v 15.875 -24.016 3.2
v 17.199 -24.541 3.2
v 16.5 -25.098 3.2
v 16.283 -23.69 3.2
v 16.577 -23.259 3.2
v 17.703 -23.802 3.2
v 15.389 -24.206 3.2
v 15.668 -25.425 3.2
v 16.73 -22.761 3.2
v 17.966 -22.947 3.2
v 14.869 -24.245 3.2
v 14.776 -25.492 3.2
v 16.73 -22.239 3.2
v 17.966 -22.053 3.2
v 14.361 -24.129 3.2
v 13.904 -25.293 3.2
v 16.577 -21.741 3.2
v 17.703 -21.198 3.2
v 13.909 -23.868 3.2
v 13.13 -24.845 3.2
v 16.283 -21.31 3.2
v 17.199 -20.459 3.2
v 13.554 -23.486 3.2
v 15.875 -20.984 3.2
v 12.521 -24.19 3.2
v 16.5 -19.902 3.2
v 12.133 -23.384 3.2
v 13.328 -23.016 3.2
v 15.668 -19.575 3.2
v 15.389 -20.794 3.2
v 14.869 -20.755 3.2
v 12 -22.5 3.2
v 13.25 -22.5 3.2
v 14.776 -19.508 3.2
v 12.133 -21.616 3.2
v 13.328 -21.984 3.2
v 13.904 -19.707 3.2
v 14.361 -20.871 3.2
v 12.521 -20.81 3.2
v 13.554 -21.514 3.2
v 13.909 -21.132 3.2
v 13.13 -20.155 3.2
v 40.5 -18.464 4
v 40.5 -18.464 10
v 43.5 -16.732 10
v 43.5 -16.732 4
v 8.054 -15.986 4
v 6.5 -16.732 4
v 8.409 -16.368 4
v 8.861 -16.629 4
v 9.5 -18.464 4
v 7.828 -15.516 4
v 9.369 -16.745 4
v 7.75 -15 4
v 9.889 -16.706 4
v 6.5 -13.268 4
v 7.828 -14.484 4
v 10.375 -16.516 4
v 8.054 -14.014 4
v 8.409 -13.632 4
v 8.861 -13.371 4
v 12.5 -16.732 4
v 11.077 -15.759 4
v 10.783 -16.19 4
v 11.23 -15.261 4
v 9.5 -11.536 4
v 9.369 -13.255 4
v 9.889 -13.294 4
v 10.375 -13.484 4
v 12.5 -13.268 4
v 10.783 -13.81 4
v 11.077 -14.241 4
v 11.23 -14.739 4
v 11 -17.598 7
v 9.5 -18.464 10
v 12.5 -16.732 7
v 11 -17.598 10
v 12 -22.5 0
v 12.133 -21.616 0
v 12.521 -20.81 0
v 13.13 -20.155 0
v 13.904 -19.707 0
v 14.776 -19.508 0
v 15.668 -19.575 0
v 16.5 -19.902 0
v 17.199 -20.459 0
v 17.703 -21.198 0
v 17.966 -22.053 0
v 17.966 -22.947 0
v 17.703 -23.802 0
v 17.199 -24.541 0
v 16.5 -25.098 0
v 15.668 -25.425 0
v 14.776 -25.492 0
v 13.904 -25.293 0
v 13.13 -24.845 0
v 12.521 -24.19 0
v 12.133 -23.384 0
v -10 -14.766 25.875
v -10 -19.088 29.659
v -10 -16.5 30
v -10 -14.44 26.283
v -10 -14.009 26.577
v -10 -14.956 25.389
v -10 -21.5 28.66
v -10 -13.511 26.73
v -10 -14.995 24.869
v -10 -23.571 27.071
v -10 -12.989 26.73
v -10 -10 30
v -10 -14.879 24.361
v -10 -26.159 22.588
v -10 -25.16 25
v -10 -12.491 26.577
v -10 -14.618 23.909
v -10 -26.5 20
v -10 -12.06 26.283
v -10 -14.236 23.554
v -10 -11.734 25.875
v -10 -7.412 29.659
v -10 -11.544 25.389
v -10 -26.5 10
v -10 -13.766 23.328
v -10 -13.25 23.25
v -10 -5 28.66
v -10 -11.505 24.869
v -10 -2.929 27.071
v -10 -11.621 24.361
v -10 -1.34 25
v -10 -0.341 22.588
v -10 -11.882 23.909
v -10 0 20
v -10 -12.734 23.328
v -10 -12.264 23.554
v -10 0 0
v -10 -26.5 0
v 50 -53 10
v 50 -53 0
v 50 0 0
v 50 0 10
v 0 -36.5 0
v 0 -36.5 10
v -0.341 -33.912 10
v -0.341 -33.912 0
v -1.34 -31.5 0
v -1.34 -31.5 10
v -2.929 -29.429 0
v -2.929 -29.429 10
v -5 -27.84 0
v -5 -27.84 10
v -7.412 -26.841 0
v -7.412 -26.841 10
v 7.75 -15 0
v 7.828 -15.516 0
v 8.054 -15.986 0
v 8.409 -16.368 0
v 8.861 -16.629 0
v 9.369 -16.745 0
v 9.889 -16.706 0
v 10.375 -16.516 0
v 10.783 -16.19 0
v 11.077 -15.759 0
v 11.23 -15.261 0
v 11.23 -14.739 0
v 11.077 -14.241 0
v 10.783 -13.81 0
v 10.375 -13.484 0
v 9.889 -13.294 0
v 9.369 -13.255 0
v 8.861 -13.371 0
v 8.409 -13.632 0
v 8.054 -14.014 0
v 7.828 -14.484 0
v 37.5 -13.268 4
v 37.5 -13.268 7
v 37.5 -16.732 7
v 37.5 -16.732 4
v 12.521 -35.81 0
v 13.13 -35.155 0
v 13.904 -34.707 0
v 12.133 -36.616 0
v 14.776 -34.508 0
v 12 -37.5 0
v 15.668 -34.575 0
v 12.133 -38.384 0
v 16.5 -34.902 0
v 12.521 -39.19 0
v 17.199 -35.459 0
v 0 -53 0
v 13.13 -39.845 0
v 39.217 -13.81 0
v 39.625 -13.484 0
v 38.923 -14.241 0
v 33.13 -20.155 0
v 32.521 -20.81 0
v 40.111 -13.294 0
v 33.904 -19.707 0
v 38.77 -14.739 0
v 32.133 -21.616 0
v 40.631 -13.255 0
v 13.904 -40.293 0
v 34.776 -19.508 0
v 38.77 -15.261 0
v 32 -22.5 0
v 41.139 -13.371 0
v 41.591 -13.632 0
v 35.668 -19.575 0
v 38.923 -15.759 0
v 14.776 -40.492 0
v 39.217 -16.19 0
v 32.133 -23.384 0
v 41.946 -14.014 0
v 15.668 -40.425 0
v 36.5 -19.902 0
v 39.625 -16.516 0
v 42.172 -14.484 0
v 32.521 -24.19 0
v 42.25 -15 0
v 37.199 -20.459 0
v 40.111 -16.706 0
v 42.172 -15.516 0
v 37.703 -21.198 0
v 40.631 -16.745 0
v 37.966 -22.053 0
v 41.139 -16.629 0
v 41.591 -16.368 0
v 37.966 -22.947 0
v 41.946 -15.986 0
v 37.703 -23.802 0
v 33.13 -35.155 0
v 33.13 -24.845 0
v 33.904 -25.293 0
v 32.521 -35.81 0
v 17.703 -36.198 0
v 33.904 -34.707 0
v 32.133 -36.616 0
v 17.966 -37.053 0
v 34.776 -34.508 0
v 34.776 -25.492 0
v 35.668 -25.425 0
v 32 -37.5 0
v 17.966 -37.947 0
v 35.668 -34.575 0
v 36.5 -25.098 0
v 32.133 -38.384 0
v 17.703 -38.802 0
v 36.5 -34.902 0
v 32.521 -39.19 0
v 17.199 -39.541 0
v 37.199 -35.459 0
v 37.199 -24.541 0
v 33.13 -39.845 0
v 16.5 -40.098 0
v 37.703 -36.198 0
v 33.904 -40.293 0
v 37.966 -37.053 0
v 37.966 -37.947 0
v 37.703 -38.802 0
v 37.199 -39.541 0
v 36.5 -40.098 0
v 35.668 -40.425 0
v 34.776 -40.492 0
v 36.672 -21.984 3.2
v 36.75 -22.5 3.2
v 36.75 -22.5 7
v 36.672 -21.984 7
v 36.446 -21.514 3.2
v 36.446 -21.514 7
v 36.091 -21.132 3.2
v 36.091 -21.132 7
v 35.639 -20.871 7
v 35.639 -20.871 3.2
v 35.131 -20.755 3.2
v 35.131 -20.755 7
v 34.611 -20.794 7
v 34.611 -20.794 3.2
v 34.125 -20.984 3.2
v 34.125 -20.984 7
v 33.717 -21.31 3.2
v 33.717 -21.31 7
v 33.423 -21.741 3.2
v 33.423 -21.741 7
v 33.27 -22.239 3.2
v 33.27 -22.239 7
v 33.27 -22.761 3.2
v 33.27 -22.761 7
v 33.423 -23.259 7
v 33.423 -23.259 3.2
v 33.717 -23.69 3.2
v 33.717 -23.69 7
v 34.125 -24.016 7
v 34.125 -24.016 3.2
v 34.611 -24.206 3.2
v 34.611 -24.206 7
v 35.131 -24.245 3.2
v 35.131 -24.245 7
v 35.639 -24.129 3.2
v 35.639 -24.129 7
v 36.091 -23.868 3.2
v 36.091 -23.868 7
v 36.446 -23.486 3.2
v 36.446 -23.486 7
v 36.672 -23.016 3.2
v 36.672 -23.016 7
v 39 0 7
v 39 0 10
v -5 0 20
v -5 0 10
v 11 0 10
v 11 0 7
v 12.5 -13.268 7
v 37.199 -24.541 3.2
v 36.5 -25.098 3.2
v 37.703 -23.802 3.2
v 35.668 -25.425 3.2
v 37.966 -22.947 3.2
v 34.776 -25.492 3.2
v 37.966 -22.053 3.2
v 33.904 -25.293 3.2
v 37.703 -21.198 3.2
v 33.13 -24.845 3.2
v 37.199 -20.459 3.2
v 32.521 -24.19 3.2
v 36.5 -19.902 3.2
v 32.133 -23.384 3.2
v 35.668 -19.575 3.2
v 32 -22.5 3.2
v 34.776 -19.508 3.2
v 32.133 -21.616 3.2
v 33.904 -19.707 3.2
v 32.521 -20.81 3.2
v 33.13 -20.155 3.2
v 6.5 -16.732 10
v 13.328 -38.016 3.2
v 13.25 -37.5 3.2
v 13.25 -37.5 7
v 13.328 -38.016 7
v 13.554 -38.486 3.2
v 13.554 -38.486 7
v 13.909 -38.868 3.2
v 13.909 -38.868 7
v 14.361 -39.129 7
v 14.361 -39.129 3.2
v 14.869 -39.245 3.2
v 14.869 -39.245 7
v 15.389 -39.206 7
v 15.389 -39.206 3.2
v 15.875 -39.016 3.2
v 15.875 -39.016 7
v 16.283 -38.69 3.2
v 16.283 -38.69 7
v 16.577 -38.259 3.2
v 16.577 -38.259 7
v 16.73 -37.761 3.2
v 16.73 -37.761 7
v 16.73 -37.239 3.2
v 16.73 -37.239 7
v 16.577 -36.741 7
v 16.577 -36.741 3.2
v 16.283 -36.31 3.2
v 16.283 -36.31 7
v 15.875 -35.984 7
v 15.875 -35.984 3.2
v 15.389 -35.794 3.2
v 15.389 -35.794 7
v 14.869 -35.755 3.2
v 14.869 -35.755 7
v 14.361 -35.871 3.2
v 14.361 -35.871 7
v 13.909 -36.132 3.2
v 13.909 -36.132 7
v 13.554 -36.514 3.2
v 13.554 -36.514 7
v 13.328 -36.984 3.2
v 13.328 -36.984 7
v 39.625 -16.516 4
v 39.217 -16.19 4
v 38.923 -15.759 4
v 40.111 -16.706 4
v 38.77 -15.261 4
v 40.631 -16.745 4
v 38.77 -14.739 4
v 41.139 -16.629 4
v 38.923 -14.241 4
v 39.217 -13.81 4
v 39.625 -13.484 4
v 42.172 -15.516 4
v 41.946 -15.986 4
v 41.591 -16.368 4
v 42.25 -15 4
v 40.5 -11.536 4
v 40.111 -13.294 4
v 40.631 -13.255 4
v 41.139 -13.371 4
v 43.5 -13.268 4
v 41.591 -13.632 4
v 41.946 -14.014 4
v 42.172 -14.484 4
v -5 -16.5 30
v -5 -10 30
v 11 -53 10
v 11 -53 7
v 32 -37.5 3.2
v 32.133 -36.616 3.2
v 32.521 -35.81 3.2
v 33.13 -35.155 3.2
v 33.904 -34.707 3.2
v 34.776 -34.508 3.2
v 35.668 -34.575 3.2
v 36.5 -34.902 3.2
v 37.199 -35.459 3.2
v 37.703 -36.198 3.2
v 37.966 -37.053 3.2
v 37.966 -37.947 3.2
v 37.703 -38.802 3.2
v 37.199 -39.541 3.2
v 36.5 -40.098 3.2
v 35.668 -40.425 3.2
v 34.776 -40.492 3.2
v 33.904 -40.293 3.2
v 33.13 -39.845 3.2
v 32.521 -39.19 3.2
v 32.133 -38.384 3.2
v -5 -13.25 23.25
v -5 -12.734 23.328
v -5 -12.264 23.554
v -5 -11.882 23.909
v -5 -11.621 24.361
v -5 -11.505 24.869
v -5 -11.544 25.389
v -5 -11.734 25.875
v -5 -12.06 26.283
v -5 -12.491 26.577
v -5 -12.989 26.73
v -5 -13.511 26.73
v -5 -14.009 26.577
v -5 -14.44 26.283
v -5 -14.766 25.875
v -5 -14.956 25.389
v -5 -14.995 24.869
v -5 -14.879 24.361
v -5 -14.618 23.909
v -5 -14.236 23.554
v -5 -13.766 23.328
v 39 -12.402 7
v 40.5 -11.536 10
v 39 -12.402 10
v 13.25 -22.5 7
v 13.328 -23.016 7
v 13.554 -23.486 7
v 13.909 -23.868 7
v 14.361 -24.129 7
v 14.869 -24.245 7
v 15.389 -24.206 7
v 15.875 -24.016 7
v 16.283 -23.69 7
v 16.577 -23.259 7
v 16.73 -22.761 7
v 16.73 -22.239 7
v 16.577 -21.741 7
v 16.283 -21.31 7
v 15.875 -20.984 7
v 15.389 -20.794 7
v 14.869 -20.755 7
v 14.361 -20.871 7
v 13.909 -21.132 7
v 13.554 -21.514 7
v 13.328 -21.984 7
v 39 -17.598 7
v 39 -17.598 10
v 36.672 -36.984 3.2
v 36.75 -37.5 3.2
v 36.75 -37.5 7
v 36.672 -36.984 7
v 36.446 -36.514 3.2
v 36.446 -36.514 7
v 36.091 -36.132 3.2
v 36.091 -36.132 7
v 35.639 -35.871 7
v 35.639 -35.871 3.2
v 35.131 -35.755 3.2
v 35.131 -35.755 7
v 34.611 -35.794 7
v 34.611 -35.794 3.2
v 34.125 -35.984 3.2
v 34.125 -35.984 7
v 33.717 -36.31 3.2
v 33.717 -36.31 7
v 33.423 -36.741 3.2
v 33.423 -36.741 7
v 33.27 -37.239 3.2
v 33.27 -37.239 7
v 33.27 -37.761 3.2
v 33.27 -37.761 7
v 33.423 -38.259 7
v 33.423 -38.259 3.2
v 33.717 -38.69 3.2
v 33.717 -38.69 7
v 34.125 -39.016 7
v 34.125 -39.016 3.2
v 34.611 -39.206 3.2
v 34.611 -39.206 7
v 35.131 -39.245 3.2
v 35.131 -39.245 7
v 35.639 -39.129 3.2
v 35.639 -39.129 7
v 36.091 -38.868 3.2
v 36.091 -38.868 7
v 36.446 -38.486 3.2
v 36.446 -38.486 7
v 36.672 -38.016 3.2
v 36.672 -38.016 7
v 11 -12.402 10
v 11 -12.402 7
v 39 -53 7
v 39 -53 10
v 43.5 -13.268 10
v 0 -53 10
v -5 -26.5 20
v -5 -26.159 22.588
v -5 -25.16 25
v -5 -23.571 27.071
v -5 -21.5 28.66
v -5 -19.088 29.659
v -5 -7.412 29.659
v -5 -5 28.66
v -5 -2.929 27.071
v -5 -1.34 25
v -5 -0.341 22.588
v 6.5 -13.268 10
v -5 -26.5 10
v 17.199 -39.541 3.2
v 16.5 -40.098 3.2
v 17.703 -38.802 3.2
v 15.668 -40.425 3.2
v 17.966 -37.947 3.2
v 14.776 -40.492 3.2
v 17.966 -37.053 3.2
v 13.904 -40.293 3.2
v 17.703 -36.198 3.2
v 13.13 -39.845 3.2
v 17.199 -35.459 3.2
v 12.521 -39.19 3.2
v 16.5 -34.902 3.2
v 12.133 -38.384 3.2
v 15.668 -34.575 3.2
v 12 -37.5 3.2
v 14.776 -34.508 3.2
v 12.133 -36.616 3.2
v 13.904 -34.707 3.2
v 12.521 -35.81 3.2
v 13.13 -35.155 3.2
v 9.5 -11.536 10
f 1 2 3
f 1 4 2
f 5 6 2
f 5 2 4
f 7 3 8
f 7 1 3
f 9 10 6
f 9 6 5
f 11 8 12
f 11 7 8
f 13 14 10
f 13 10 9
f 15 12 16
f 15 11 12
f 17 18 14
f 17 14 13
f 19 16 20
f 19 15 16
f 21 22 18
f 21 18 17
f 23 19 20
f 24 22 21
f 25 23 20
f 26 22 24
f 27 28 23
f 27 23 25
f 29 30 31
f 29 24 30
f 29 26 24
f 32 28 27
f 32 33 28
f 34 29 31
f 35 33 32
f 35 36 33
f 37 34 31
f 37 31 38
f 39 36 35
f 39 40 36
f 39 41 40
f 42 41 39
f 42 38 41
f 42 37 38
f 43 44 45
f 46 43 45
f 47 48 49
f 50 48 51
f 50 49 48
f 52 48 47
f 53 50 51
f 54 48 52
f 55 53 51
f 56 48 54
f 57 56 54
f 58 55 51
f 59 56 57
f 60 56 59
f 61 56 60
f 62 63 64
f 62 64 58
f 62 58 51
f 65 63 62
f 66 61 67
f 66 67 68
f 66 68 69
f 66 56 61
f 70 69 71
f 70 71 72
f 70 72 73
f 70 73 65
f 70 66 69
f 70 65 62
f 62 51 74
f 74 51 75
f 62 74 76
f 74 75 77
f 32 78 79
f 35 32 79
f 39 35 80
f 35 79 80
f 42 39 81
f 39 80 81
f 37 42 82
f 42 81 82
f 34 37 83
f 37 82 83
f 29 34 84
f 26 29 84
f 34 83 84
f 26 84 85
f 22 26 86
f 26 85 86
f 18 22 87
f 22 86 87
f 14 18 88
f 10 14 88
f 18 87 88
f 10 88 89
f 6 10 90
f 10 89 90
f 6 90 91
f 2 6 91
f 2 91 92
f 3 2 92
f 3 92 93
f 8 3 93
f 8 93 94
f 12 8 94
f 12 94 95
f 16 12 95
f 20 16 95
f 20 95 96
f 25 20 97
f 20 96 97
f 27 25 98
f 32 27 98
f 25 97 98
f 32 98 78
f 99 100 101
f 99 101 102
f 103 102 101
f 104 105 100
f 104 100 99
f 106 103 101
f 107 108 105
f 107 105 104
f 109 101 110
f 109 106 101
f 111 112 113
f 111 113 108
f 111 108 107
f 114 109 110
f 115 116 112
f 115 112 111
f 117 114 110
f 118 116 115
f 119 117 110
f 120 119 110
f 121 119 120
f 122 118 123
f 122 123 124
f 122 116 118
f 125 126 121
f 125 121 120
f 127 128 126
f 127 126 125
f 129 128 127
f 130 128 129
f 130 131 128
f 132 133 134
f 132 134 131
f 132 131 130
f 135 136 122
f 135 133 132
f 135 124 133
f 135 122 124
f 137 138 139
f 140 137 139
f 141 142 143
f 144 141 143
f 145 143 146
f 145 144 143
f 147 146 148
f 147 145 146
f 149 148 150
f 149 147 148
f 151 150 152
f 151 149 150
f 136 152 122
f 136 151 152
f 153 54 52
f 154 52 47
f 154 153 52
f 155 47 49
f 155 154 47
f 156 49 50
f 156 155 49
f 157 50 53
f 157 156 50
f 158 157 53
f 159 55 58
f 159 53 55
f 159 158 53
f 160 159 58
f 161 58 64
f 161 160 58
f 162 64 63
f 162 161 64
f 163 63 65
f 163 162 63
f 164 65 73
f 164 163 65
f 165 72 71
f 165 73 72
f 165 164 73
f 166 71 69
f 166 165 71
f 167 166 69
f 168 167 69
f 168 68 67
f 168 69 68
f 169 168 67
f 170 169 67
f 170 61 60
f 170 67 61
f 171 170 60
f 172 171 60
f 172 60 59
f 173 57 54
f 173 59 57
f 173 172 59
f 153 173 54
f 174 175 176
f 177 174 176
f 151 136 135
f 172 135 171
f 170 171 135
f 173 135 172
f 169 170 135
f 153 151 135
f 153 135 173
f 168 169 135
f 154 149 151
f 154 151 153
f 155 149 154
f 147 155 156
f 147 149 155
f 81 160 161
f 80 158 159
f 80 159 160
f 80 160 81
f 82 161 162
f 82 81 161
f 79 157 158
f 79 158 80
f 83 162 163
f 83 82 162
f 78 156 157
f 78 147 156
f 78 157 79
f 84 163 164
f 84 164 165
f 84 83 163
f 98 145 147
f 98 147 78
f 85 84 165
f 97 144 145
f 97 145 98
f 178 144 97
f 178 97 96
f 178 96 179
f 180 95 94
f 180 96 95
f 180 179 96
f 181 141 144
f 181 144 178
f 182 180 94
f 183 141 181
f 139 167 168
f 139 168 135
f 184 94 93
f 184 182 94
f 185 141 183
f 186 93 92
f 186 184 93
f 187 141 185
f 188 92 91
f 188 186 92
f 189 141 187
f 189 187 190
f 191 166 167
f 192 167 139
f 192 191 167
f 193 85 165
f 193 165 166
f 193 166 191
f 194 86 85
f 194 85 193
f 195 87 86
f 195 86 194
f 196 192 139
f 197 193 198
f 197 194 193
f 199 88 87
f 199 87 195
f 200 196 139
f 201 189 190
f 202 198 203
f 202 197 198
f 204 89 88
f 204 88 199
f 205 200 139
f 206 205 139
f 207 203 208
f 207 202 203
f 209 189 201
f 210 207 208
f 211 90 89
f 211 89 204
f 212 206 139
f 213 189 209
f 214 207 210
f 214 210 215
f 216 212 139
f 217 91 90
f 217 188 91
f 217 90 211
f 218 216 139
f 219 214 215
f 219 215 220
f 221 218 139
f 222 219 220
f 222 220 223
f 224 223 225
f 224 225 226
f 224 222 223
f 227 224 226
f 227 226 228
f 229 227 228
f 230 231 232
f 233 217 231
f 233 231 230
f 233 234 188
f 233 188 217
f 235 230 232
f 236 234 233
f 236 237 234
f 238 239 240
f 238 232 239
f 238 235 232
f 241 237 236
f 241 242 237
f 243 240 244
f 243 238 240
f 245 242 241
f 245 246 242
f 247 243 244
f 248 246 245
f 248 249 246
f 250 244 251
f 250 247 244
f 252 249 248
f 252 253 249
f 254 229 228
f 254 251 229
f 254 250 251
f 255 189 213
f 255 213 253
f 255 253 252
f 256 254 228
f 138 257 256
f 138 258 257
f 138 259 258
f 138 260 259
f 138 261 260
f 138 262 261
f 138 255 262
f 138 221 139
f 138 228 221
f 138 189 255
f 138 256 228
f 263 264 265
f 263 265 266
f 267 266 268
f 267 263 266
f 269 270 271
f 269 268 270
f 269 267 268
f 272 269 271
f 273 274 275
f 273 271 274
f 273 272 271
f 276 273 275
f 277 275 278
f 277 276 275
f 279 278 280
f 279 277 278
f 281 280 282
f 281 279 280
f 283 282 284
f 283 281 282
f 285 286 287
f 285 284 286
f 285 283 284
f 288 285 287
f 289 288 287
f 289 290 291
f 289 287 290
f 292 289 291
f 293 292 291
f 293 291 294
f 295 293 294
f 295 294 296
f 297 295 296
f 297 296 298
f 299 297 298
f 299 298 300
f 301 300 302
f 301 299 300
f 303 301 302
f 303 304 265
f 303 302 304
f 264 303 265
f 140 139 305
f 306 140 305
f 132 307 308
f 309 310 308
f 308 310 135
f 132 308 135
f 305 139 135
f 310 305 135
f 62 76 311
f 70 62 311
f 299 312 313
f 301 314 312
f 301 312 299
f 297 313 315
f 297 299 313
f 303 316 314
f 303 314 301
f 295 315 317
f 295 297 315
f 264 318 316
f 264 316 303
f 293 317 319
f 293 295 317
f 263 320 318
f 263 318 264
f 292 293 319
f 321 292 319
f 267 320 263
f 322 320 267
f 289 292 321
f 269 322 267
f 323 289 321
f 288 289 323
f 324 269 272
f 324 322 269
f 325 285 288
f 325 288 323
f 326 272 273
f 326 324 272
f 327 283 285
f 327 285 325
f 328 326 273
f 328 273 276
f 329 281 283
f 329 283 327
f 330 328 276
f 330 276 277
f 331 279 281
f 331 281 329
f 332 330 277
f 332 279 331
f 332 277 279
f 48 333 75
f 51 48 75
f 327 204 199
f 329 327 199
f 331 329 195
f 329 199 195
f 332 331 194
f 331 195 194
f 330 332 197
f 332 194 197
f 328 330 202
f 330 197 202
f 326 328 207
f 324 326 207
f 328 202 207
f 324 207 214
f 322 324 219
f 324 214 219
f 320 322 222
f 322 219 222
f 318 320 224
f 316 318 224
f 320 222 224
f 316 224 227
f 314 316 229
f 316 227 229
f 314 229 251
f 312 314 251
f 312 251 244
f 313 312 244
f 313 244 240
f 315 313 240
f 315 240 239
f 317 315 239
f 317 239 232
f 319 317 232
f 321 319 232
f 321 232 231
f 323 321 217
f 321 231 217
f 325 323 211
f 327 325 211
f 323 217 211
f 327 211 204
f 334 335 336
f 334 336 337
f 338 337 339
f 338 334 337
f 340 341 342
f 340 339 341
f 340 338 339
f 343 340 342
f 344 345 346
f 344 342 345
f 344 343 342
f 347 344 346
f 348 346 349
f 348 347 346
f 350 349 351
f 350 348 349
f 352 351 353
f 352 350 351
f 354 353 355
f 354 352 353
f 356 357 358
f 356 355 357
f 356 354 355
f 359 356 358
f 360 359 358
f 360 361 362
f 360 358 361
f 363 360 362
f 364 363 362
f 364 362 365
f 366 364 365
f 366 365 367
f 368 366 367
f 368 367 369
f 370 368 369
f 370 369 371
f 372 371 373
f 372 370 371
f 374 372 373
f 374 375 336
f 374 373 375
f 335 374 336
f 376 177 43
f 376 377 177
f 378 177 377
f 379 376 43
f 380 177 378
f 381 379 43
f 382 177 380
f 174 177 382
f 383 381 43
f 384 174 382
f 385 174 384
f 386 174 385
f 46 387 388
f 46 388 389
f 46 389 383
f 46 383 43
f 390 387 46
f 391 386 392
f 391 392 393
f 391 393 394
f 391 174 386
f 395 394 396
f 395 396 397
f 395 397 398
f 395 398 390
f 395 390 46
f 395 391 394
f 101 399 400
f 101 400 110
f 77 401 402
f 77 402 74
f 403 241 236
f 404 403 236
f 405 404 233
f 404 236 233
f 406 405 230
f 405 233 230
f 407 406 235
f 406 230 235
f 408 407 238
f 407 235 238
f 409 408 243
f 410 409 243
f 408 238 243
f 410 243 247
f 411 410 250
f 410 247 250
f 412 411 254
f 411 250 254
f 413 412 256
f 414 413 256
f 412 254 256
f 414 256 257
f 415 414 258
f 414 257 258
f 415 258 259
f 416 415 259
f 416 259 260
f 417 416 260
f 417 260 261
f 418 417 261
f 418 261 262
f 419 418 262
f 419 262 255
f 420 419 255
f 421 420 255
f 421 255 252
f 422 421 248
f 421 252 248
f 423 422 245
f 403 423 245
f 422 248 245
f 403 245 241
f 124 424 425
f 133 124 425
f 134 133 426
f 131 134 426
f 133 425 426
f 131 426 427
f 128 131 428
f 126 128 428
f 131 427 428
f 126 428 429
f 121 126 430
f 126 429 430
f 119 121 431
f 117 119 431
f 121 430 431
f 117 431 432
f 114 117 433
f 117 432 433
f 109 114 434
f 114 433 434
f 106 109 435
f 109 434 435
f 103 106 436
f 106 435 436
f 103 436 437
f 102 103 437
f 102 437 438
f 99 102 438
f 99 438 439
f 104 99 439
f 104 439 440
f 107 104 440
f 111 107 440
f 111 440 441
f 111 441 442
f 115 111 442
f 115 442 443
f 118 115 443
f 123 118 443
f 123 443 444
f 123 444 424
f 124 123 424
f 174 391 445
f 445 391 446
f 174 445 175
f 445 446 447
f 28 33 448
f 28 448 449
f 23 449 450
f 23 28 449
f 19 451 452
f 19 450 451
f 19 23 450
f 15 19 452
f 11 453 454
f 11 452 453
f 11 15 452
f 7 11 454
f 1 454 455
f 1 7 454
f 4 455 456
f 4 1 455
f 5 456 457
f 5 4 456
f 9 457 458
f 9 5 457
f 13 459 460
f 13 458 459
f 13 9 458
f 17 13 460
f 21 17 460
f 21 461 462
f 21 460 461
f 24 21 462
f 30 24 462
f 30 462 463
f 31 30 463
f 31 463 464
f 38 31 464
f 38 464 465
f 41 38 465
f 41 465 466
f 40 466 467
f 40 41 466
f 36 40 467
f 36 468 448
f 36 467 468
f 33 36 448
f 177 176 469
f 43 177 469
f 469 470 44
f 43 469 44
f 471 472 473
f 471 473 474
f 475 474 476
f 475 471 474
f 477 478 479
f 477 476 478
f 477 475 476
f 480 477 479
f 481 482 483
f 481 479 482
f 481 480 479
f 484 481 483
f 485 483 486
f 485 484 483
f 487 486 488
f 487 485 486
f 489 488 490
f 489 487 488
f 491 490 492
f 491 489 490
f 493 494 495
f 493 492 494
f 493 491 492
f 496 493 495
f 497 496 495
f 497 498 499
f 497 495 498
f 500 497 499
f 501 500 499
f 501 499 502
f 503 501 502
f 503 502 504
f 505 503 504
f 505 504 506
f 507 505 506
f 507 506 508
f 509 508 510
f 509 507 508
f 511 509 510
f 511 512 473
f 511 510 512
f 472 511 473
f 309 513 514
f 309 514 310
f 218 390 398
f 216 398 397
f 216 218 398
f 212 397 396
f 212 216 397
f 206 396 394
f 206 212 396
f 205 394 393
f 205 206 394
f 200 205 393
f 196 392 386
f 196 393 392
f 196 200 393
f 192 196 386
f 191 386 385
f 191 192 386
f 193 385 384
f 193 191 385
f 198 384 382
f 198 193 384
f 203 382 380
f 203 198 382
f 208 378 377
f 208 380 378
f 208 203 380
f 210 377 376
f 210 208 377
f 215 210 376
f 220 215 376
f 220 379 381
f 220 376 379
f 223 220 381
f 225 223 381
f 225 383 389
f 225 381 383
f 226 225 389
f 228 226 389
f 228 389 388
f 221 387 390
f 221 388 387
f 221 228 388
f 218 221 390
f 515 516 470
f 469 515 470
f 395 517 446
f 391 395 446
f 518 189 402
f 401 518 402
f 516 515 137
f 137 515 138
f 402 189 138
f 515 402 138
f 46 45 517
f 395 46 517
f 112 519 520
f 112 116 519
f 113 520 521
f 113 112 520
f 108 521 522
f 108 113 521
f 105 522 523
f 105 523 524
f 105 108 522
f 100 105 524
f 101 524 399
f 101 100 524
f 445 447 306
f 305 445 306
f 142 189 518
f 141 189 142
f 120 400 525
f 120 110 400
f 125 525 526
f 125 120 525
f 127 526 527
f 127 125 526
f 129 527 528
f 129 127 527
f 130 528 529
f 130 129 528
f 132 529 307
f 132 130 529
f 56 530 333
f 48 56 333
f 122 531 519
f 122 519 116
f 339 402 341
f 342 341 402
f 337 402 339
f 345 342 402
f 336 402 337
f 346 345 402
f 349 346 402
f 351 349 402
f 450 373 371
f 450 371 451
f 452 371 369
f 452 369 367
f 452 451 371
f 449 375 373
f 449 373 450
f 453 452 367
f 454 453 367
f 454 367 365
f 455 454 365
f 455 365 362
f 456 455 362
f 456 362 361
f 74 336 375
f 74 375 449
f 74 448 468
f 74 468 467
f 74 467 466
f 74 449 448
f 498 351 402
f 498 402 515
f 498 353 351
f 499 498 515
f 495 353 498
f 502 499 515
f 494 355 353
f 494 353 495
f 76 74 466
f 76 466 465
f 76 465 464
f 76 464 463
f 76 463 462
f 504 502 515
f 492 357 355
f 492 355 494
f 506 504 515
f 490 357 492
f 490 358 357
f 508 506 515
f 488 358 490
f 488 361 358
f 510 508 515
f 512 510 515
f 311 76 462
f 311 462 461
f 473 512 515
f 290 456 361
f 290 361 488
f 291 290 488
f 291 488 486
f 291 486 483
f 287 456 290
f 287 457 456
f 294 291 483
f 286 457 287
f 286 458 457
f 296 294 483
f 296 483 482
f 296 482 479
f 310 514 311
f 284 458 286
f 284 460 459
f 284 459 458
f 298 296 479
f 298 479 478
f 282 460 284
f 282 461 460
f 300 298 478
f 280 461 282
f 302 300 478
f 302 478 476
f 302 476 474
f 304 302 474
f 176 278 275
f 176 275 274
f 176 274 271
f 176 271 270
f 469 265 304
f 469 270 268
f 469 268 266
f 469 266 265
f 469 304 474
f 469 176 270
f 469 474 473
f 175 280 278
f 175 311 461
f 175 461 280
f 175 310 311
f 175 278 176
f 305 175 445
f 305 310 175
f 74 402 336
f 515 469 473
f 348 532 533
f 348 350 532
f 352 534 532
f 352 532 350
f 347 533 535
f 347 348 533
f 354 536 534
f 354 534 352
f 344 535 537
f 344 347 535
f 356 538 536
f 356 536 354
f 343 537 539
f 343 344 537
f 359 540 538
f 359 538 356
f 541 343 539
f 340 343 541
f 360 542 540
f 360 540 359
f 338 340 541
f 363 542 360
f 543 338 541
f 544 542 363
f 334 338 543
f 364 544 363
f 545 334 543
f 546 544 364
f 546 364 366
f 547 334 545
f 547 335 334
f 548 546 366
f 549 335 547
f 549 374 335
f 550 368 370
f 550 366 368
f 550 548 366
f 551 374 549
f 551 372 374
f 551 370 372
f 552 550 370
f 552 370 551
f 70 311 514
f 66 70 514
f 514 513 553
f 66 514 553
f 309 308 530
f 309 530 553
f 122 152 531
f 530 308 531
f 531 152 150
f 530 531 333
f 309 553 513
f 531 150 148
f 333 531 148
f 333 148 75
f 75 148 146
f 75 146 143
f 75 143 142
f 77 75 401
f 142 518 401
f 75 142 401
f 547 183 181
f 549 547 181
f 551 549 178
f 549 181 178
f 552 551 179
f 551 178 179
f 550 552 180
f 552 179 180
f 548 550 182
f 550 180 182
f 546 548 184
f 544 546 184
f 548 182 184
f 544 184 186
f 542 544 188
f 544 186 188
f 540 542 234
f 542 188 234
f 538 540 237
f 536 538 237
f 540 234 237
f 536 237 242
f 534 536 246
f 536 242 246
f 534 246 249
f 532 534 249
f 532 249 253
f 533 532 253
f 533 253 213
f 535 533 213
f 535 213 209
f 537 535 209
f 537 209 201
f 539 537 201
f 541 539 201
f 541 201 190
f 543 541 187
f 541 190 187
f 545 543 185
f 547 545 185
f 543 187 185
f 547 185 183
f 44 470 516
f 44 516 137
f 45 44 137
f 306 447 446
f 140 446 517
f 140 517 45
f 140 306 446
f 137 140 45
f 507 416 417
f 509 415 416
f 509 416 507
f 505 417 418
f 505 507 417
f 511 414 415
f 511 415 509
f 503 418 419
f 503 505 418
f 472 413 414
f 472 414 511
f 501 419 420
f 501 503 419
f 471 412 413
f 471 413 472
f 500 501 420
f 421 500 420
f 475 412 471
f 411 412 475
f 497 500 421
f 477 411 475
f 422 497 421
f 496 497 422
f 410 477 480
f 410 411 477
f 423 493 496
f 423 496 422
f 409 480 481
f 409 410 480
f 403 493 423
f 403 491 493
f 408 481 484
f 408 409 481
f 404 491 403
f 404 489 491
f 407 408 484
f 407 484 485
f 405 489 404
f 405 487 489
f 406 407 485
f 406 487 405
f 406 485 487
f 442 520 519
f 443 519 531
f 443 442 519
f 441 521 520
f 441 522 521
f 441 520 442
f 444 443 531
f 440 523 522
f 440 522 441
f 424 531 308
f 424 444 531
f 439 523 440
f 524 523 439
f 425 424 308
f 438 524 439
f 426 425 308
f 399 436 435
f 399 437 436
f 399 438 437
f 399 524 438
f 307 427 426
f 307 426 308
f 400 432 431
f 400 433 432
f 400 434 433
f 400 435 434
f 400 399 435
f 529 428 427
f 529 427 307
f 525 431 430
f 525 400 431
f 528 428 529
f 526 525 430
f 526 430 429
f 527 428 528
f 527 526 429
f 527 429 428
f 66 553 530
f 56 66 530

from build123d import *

# Parameters (mm, degrees)
SKETCH_1_W          = 50
SKETCH_1_H          = 53
SKETCH_1_R          = 1.75
EXTRUDE_1_DEPTH     = 10
SKETCH_2_W          = 28
SKETCH_2_H          = 53
CUT_EXTRUDE_1_DEPTH = 3
CUT_EXTRUDE_2_DEPTH = 6
SKETCH_5_R          = 3
CUT_EXTRUDE_4_DEPTH = 3.2
SKETCH_6_W          = 10
SKETCH_6_H          = 26.5
EXTRUDE_2_DEPTH     = 30
SKETCH_7_W          = 5
SKETCH_7_H          = 26.5
CUT_EXTRUDE_5_DEPTH = 20
FILLET_2_R          = 10
FILLET_3_R          = 10
SKETCH_8_R          = 1.75
CUT_EXTRUDE_6_DEPTH = 20


with BuildPart() as part:
    # 草图1 → 凸台-拉伸1 (new body)
    with BuildSketch(Plane.XY):
        with Locations((25, -26.5)):
            Rectangle(SKETCH_1_W, SKETCH_1_H)
        with Locations((35, -22.5)):
            Circle(SKETCH_1_R, mode=Mode.SUBTRACT)
        with Locations((40.5, -15)):
            Circle(SKETCH_1_R, mode=Mode.SUBTRACT)
        with Locations((35, -37.5)):
            Circle(SKETCH_1_R, mode=Mode.SUBTRACT)
        with Locations(Location((15, -37.5, 0), (0, 0, 180))):
            Circle(SKETCH_1_R, mode=Mode.SUBTRACT)
        with Locations(Location((15, -22.5, 0), (0, 0, 180))):
            Circle(SKETCH_1_R, mode=Mode.SUBTRACT)
        with Locations(Location((9.5, -15, 0), (0, 0, 180))):
            Circle(SKETCH_1_R, mode=Mode.SUBTRACT)
    extrude(amount=EXTRUDE_1_DEPTH)

    # 草图2 → 切除-拉伸1 (cut)
    with BuildSketch(Plane.XY.offset(10)):
        with Locations((25, -26.5)):
            Rectangle(SKETCH_2_W, SKETCH_2_H)
    extrude(amount=-CUT_EXTRUDE_1_DEPTH, mode=Mode.SUBTRACT)

    # 草图3 → 切除-拉伸2 (cut)
    with BuildSketch(Plane.XY.offset(10)):
        Polygon((9.5, -18.464101615), (12.5, -16.732050808), (12.5, -13.267949192), (9.5, -11.535898385), (6.5, -13.267949192), (6.5, -16.732050808), align=None)
        Polygon((40.5, -18.464101615), (43.5, -16.732050808), (43.5, -13.267949192), (40.5, -11.535898385), (37.5, -13.267949192), (37.5, -16.732050808), align=None)
    extrude(amount=-CUT_EXTRUDE_2_DEPTH, mode=Mode.SUBTRACT)

    # 草图5 → 切除-拉伸4 (cut)
    with BuildSketch(Plane(origin=(0, 0, 0), x_dir=(-1, 0, 0), z_dir=(0, 0, -1))):
        with Locations((-35, -37.5)):
            Circle(SKETCH_5_R)
        with Locations((-35, -22.5)):
            Circle(SKETCH_5_R)
        with Locations((-15, -37.5)):
            Circle(SKETCH_5_R)
        with Locations((-15, -22.5)):
            Circle(SKETCH_5_R)
    extrude(amount=-CUT_EXTRUDE_4_DEPTH, mode=Mode.SUBTRACT)

    # 草图6 → 凸台-拉伸2 (add)
    with BuildSketch(Plane(origin=(0, 0, 0), x_dir=(-1, 0, 0), z_dir=(0, 0, -1))):
        with Locations((5, -13.25)):
            Rectangle(SKETCH_6_W, SKETCH_6_H)
    extrude(amount=-EXTRUDE_2_DEPTH)

    # 草图7 → 切除-拉伸5 (cut)
    with BuildSketch(Plane.XY.offset(30)):
        with Locations((-2.5, -13.25)):
            Rectangle(SKETCH_7_W, SKETCH_7_H)
    extrude(amount=-CUT_EXTRUDE_5_DEPTH, mode=Mode.SUBTRACT)

    # 圆角2
    fillet_2_edges = [part.edges().sort_by_distance(p)[0] for p in [
        (-7.5, 0, 30),
        (-7.5, -26.5, 30),
    ]]
    fillet(fillet_2_edges, radius=FILLET_2_R)

    # 圆角3
    # the kernel refuses this fillet: 10 mm, written as the material it adds along each edge
    with BuildSketch(Plane(origin=(0, -26.5, 0), x_dir=(-1, 0, 0), z_dir=(0, 0, 1))) as fillet_3_piece_1:
        with BuildLine():
            CenterArc((FILLET_3_R, FILLET_3_R), FILLET_3_R, 180, 90)
            Line((0, FILLET_3_R), (0, 0))
            Line((0, 0), (FILLET_3_R, 0))
        make_face()
    extrude(amount=10)

    # 草图8 → 切除-拉伸6 (cut)
    with BuildSketch(Plane(origin=(-5, 0, 0), x_dir=(0, 0, -1), z_dir=(1, 0, 0))):
        with Locations((-25, -13.25)):
            Circle(SKETCH_8_R)
    extrude(amount=-CUT_EXTRUDE_6_DEPTH, mode=Mode.SUBTRACT)


solid = part.part
